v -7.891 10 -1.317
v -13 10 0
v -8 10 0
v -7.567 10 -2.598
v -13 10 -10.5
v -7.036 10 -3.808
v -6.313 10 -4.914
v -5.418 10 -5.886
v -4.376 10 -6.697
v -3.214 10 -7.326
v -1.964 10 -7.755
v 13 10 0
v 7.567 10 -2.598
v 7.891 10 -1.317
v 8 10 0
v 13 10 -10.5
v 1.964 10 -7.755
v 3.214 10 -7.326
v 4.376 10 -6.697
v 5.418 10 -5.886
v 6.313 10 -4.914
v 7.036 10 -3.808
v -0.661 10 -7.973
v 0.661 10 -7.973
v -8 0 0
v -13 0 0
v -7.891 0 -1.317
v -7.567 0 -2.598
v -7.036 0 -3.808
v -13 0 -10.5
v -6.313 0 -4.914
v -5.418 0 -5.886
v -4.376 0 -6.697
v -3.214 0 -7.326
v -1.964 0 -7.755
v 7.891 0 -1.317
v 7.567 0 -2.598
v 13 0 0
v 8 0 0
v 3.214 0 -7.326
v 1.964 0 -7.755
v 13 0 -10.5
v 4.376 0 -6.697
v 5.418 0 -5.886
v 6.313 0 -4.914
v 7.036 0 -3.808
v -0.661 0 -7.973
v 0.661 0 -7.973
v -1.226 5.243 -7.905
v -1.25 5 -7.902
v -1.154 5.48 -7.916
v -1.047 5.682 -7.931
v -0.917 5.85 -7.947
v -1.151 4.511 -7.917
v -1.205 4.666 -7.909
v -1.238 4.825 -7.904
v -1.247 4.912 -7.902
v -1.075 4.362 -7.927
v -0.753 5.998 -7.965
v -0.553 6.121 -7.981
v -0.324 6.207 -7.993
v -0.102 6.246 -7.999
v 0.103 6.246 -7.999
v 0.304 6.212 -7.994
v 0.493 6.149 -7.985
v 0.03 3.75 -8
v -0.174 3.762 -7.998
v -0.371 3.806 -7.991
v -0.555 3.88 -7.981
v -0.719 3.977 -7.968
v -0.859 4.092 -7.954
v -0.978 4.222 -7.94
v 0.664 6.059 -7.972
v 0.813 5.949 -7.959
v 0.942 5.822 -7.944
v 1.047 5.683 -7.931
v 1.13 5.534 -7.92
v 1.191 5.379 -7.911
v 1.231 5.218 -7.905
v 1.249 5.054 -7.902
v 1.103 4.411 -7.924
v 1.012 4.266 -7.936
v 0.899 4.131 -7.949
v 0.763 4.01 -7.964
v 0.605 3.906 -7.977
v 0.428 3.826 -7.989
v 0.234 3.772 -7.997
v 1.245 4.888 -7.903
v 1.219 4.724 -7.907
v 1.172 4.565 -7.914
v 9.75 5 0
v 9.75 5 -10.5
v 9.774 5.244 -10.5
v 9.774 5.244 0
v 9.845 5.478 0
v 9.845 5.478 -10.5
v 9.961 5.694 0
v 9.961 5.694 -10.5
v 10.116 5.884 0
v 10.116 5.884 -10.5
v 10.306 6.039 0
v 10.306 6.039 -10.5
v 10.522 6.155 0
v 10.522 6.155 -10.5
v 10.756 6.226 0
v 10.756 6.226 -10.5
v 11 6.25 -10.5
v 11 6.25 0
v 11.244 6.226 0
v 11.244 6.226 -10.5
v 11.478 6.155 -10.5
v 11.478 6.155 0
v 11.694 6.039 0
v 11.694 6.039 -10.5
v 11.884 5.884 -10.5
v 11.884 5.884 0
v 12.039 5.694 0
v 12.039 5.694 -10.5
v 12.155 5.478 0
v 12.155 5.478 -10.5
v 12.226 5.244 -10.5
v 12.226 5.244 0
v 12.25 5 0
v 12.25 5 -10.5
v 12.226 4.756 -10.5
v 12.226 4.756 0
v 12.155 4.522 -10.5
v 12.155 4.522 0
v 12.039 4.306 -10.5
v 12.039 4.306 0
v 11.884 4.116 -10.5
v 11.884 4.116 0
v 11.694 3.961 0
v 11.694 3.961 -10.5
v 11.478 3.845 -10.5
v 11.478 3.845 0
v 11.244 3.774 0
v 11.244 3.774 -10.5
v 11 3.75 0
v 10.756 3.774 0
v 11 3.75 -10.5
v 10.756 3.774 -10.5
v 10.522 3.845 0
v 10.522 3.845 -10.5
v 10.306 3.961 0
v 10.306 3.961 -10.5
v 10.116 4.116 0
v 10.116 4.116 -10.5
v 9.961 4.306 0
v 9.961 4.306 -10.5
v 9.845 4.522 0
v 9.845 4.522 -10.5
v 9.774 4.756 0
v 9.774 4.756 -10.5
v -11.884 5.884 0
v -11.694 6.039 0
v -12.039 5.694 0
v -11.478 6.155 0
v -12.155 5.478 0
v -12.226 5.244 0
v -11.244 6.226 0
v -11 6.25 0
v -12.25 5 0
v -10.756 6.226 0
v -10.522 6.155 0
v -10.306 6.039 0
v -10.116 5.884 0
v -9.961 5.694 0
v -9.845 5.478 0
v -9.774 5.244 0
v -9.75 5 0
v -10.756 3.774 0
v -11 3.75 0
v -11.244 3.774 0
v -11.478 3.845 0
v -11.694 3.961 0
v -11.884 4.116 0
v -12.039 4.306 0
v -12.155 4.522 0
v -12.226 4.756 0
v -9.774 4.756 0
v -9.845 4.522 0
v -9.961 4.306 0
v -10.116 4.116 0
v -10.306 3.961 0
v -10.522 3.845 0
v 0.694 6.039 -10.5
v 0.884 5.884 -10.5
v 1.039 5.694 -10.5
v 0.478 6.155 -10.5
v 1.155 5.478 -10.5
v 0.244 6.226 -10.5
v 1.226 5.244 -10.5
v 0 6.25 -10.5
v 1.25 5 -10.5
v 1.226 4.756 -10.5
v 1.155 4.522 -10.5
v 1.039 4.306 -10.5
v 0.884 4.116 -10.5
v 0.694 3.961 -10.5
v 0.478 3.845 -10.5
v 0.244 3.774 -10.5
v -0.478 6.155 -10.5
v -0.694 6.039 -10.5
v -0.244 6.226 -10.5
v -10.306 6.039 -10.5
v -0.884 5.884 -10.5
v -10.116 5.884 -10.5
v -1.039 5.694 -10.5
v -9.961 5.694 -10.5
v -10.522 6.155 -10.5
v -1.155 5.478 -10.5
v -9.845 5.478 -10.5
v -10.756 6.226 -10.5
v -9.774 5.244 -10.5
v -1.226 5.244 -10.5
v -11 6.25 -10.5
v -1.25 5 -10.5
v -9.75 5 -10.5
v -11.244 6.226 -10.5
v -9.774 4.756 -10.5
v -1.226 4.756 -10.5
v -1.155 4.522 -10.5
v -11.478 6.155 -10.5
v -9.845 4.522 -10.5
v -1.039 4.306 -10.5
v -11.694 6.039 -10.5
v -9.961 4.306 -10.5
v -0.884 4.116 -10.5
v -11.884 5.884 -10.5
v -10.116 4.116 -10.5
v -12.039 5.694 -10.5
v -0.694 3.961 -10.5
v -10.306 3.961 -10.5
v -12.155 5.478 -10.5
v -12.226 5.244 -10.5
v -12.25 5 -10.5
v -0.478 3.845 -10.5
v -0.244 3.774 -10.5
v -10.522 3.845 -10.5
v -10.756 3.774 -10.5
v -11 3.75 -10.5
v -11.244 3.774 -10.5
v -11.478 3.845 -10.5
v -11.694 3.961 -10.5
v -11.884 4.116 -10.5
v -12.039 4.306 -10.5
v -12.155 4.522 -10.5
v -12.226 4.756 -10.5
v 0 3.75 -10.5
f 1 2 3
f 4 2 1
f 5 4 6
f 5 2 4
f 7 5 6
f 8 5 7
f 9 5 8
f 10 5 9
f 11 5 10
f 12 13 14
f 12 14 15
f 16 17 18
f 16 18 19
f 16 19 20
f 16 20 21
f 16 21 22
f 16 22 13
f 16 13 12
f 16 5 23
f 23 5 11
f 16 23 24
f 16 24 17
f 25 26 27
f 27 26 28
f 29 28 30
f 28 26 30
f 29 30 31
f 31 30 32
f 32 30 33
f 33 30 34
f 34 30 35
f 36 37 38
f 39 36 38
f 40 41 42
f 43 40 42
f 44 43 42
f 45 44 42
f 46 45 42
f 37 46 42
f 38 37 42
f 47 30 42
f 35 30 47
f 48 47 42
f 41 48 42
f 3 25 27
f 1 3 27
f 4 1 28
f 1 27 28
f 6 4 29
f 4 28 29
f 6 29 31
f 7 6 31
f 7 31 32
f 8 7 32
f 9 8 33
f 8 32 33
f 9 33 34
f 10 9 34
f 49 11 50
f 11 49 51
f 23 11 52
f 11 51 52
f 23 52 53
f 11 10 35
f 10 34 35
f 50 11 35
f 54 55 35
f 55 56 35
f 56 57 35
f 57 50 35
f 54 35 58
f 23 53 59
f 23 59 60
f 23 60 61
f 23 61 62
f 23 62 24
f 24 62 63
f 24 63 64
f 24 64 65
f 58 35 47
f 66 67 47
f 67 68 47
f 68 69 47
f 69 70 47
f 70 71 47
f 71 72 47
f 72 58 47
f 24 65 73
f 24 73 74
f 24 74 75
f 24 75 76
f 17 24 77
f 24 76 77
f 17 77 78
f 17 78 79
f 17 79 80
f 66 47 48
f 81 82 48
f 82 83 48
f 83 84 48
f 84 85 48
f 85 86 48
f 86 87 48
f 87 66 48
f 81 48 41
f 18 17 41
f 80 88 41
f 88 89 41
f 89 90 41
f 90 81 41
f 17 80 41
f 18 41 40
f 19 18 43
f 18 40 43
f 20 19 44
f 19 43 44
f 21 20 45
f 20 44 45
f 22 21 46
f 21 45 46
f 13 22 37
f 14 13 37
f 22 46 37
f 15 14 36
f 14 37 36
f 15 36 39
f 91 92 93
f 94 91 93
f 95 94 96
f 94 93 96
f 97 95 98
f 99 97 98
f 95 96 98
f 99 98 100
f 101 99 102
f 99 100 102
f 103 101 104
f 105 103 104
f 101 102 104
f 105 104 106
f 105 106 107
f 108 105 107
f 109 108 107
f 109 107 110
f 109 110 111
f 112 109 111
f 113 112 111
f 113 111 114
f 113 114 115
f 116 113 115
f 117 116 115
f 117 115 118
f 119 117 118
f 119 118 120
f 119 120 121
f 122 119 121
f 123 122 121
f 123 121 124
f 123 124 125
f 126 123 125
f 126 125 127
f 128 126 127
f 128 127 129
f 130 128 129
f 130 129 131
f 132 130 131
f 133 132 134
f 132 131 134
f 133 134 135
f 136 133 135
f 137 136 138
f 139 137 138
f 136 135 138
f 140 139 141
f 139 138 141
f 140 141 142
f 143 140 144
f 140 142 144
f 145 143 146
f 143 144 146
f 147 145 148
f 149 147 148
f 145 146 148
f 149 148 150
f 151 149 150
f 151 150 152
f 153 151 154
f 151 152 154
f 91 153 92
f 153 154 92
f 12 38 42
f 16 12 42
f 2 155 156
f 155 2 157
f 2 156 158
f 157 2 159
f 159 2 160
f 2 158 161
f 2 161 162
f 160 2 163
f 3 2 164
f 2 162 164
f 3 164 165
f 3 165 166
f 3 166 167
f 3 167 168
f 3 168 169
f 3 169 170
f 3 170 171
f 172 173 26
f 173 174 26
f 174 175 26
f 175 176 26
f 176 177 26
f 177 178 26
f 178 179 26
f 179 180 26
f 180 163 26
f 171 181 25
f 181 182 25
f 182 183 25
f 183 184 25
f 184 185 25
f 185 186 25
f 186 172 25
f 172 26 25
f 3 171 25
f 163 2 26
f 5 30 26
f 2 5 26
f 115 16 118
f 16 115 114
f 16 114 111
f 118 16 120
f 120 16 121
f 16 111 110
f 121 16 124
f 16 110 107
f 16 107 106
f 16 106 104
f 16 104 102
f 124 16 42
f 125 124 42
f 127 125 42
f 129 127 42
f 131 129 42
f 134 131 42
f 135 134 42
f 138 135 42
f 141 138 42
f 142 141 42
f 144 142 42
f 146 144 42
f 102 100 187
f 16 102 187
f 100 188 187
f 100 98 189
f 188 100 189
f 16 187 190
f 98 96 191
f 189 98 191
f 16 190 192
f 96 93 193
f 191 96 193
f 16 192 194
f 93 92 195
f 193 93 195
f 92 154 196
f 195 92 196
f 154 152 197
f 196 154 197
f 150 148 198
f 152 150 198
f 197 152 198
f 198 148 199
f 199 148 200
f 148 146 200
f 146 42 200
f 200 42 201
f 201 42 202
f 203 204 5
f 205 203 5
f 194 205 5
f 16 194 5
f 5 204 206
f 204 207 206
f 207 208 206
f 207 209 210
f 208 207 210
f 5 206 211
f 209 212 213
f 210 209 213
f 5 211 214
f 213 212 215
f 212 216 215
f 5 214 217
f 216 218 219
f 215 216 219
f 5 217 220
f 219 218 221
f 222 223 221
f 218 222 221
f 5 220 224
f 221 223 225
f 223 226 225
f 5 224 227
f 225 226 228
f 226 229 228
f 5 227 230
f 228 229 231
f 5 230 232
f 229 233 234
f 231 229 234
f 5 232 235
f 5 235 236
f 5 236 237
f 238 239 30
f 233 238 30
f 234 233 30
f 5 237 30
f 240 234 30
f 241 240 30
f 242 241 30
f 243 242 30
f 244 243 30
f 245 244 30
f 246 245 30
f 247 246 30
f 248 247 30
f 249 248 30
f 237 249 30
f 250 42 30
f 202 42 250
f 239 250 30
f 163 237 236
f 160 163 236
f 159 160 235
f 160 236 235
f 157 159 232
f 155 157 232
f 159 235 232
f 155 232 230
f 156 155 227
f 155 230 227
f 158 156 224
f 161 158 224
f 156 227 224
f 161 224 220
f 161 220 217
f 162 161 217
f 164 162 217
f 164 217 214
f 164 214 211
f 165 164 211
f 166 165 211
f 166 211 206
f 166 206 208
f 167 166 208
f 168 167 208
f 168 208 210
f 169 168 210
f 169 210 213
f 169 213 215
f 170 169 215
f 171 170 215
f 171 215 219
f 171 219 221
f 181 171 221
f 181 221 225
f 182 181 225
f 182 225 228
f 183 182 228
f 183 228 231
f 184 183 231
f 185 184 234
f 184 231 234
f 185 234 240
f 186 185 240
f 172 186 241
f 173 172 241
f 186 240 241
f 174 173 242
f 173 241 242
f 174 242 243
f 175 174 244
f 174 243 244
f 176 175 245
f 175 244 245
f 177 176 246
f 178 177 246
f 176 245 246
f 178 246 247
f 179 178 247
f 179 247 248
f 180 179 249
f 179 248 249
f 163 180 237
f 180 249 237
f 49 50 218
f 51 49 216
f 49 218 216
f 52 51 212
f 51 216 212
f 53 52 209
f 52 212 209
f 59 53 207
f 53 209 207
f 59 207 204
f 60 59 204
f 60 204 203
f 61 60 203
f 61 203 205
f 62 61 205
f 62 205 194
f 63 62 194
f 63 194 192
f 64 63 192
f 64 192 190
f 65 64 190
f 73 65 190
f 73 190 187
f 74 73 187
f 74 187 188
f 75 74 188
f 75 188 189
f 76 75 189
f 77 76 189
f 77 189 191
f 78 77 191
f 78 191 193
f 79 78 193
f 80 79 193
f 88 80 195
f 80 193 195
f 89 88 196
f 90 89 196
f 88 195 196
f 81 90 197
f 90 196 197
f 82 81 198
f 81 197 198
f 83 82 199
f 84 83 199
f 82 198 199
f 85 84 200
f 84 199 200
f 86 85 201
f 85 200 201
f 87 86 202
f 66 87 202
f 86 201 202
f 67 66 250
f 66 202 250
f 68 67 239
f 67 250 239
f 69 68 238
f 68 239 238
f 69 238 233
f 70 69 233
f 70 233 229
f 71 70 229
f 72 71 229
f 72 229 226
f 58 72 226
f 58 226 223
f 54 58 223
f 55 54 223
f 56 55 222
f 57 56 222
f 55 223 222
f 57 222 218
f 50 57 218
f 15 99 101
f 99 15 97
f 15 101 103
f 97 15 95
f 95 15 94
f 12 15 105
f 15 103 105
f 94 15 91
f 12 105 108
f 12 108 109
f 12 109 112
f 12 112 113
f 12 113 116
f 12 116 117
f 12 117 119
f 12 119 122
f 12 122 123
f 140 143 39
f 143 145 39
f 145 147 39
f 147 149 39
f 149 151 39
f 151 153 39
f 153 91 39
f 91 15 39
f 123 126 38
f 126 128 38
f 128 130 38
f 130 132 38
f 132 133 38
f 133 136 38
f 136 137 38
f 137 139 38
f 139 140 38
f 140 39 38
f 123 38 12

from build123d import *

# Parameters (mm, degrees)
EXTRUDE_1_DEPTH     = 10
SKETCH_2_R          = 1.25
CUT_EXTRUDE_2_DEPTH = 13


with BuildPart() as part:
    # 草图1 → 凸台-拉伸1 (new body)
    with BuildSketch(Plane(origin=(0, 0, 0), x_dir=(1, 0, 0), z_dir=(0, 1, 0))):
        with BuildLine():
            Line((8, 0), (13, 0))
            Line((13, 0), (13, 10.5))
            Line((13, 10.5), (-13, 10.5))
            Line((-13, 10.5), (-13, 0))
            Line((-13, 0), (-8, 0))
            ThreePointArc((-8, 0), (0, 8), (8, 0))
        make_face()
    extrude(amount=EXTRUDE_1_DEPTH)

    # 草图2 → 切除-拉伸2 (cut)
    with BuildSketch(Plane(origin=(0, 0, -10.5), x_dir=(-1, 0, 0), z_dir=(0, 0, -1))):
        with Locations((-11, 5)):
            Circle(SKETCH_2_R)
        with Locations((0, 5)):
            Circle(SKETCH_2_R)
        with Locations((11, 5)):
            Circle(SKETCH_2_R)
    extrude(amount=-CUT_EXTRUDE_2_DEPTH, mode=Mode.SUBTRACT)


solid = part.part
